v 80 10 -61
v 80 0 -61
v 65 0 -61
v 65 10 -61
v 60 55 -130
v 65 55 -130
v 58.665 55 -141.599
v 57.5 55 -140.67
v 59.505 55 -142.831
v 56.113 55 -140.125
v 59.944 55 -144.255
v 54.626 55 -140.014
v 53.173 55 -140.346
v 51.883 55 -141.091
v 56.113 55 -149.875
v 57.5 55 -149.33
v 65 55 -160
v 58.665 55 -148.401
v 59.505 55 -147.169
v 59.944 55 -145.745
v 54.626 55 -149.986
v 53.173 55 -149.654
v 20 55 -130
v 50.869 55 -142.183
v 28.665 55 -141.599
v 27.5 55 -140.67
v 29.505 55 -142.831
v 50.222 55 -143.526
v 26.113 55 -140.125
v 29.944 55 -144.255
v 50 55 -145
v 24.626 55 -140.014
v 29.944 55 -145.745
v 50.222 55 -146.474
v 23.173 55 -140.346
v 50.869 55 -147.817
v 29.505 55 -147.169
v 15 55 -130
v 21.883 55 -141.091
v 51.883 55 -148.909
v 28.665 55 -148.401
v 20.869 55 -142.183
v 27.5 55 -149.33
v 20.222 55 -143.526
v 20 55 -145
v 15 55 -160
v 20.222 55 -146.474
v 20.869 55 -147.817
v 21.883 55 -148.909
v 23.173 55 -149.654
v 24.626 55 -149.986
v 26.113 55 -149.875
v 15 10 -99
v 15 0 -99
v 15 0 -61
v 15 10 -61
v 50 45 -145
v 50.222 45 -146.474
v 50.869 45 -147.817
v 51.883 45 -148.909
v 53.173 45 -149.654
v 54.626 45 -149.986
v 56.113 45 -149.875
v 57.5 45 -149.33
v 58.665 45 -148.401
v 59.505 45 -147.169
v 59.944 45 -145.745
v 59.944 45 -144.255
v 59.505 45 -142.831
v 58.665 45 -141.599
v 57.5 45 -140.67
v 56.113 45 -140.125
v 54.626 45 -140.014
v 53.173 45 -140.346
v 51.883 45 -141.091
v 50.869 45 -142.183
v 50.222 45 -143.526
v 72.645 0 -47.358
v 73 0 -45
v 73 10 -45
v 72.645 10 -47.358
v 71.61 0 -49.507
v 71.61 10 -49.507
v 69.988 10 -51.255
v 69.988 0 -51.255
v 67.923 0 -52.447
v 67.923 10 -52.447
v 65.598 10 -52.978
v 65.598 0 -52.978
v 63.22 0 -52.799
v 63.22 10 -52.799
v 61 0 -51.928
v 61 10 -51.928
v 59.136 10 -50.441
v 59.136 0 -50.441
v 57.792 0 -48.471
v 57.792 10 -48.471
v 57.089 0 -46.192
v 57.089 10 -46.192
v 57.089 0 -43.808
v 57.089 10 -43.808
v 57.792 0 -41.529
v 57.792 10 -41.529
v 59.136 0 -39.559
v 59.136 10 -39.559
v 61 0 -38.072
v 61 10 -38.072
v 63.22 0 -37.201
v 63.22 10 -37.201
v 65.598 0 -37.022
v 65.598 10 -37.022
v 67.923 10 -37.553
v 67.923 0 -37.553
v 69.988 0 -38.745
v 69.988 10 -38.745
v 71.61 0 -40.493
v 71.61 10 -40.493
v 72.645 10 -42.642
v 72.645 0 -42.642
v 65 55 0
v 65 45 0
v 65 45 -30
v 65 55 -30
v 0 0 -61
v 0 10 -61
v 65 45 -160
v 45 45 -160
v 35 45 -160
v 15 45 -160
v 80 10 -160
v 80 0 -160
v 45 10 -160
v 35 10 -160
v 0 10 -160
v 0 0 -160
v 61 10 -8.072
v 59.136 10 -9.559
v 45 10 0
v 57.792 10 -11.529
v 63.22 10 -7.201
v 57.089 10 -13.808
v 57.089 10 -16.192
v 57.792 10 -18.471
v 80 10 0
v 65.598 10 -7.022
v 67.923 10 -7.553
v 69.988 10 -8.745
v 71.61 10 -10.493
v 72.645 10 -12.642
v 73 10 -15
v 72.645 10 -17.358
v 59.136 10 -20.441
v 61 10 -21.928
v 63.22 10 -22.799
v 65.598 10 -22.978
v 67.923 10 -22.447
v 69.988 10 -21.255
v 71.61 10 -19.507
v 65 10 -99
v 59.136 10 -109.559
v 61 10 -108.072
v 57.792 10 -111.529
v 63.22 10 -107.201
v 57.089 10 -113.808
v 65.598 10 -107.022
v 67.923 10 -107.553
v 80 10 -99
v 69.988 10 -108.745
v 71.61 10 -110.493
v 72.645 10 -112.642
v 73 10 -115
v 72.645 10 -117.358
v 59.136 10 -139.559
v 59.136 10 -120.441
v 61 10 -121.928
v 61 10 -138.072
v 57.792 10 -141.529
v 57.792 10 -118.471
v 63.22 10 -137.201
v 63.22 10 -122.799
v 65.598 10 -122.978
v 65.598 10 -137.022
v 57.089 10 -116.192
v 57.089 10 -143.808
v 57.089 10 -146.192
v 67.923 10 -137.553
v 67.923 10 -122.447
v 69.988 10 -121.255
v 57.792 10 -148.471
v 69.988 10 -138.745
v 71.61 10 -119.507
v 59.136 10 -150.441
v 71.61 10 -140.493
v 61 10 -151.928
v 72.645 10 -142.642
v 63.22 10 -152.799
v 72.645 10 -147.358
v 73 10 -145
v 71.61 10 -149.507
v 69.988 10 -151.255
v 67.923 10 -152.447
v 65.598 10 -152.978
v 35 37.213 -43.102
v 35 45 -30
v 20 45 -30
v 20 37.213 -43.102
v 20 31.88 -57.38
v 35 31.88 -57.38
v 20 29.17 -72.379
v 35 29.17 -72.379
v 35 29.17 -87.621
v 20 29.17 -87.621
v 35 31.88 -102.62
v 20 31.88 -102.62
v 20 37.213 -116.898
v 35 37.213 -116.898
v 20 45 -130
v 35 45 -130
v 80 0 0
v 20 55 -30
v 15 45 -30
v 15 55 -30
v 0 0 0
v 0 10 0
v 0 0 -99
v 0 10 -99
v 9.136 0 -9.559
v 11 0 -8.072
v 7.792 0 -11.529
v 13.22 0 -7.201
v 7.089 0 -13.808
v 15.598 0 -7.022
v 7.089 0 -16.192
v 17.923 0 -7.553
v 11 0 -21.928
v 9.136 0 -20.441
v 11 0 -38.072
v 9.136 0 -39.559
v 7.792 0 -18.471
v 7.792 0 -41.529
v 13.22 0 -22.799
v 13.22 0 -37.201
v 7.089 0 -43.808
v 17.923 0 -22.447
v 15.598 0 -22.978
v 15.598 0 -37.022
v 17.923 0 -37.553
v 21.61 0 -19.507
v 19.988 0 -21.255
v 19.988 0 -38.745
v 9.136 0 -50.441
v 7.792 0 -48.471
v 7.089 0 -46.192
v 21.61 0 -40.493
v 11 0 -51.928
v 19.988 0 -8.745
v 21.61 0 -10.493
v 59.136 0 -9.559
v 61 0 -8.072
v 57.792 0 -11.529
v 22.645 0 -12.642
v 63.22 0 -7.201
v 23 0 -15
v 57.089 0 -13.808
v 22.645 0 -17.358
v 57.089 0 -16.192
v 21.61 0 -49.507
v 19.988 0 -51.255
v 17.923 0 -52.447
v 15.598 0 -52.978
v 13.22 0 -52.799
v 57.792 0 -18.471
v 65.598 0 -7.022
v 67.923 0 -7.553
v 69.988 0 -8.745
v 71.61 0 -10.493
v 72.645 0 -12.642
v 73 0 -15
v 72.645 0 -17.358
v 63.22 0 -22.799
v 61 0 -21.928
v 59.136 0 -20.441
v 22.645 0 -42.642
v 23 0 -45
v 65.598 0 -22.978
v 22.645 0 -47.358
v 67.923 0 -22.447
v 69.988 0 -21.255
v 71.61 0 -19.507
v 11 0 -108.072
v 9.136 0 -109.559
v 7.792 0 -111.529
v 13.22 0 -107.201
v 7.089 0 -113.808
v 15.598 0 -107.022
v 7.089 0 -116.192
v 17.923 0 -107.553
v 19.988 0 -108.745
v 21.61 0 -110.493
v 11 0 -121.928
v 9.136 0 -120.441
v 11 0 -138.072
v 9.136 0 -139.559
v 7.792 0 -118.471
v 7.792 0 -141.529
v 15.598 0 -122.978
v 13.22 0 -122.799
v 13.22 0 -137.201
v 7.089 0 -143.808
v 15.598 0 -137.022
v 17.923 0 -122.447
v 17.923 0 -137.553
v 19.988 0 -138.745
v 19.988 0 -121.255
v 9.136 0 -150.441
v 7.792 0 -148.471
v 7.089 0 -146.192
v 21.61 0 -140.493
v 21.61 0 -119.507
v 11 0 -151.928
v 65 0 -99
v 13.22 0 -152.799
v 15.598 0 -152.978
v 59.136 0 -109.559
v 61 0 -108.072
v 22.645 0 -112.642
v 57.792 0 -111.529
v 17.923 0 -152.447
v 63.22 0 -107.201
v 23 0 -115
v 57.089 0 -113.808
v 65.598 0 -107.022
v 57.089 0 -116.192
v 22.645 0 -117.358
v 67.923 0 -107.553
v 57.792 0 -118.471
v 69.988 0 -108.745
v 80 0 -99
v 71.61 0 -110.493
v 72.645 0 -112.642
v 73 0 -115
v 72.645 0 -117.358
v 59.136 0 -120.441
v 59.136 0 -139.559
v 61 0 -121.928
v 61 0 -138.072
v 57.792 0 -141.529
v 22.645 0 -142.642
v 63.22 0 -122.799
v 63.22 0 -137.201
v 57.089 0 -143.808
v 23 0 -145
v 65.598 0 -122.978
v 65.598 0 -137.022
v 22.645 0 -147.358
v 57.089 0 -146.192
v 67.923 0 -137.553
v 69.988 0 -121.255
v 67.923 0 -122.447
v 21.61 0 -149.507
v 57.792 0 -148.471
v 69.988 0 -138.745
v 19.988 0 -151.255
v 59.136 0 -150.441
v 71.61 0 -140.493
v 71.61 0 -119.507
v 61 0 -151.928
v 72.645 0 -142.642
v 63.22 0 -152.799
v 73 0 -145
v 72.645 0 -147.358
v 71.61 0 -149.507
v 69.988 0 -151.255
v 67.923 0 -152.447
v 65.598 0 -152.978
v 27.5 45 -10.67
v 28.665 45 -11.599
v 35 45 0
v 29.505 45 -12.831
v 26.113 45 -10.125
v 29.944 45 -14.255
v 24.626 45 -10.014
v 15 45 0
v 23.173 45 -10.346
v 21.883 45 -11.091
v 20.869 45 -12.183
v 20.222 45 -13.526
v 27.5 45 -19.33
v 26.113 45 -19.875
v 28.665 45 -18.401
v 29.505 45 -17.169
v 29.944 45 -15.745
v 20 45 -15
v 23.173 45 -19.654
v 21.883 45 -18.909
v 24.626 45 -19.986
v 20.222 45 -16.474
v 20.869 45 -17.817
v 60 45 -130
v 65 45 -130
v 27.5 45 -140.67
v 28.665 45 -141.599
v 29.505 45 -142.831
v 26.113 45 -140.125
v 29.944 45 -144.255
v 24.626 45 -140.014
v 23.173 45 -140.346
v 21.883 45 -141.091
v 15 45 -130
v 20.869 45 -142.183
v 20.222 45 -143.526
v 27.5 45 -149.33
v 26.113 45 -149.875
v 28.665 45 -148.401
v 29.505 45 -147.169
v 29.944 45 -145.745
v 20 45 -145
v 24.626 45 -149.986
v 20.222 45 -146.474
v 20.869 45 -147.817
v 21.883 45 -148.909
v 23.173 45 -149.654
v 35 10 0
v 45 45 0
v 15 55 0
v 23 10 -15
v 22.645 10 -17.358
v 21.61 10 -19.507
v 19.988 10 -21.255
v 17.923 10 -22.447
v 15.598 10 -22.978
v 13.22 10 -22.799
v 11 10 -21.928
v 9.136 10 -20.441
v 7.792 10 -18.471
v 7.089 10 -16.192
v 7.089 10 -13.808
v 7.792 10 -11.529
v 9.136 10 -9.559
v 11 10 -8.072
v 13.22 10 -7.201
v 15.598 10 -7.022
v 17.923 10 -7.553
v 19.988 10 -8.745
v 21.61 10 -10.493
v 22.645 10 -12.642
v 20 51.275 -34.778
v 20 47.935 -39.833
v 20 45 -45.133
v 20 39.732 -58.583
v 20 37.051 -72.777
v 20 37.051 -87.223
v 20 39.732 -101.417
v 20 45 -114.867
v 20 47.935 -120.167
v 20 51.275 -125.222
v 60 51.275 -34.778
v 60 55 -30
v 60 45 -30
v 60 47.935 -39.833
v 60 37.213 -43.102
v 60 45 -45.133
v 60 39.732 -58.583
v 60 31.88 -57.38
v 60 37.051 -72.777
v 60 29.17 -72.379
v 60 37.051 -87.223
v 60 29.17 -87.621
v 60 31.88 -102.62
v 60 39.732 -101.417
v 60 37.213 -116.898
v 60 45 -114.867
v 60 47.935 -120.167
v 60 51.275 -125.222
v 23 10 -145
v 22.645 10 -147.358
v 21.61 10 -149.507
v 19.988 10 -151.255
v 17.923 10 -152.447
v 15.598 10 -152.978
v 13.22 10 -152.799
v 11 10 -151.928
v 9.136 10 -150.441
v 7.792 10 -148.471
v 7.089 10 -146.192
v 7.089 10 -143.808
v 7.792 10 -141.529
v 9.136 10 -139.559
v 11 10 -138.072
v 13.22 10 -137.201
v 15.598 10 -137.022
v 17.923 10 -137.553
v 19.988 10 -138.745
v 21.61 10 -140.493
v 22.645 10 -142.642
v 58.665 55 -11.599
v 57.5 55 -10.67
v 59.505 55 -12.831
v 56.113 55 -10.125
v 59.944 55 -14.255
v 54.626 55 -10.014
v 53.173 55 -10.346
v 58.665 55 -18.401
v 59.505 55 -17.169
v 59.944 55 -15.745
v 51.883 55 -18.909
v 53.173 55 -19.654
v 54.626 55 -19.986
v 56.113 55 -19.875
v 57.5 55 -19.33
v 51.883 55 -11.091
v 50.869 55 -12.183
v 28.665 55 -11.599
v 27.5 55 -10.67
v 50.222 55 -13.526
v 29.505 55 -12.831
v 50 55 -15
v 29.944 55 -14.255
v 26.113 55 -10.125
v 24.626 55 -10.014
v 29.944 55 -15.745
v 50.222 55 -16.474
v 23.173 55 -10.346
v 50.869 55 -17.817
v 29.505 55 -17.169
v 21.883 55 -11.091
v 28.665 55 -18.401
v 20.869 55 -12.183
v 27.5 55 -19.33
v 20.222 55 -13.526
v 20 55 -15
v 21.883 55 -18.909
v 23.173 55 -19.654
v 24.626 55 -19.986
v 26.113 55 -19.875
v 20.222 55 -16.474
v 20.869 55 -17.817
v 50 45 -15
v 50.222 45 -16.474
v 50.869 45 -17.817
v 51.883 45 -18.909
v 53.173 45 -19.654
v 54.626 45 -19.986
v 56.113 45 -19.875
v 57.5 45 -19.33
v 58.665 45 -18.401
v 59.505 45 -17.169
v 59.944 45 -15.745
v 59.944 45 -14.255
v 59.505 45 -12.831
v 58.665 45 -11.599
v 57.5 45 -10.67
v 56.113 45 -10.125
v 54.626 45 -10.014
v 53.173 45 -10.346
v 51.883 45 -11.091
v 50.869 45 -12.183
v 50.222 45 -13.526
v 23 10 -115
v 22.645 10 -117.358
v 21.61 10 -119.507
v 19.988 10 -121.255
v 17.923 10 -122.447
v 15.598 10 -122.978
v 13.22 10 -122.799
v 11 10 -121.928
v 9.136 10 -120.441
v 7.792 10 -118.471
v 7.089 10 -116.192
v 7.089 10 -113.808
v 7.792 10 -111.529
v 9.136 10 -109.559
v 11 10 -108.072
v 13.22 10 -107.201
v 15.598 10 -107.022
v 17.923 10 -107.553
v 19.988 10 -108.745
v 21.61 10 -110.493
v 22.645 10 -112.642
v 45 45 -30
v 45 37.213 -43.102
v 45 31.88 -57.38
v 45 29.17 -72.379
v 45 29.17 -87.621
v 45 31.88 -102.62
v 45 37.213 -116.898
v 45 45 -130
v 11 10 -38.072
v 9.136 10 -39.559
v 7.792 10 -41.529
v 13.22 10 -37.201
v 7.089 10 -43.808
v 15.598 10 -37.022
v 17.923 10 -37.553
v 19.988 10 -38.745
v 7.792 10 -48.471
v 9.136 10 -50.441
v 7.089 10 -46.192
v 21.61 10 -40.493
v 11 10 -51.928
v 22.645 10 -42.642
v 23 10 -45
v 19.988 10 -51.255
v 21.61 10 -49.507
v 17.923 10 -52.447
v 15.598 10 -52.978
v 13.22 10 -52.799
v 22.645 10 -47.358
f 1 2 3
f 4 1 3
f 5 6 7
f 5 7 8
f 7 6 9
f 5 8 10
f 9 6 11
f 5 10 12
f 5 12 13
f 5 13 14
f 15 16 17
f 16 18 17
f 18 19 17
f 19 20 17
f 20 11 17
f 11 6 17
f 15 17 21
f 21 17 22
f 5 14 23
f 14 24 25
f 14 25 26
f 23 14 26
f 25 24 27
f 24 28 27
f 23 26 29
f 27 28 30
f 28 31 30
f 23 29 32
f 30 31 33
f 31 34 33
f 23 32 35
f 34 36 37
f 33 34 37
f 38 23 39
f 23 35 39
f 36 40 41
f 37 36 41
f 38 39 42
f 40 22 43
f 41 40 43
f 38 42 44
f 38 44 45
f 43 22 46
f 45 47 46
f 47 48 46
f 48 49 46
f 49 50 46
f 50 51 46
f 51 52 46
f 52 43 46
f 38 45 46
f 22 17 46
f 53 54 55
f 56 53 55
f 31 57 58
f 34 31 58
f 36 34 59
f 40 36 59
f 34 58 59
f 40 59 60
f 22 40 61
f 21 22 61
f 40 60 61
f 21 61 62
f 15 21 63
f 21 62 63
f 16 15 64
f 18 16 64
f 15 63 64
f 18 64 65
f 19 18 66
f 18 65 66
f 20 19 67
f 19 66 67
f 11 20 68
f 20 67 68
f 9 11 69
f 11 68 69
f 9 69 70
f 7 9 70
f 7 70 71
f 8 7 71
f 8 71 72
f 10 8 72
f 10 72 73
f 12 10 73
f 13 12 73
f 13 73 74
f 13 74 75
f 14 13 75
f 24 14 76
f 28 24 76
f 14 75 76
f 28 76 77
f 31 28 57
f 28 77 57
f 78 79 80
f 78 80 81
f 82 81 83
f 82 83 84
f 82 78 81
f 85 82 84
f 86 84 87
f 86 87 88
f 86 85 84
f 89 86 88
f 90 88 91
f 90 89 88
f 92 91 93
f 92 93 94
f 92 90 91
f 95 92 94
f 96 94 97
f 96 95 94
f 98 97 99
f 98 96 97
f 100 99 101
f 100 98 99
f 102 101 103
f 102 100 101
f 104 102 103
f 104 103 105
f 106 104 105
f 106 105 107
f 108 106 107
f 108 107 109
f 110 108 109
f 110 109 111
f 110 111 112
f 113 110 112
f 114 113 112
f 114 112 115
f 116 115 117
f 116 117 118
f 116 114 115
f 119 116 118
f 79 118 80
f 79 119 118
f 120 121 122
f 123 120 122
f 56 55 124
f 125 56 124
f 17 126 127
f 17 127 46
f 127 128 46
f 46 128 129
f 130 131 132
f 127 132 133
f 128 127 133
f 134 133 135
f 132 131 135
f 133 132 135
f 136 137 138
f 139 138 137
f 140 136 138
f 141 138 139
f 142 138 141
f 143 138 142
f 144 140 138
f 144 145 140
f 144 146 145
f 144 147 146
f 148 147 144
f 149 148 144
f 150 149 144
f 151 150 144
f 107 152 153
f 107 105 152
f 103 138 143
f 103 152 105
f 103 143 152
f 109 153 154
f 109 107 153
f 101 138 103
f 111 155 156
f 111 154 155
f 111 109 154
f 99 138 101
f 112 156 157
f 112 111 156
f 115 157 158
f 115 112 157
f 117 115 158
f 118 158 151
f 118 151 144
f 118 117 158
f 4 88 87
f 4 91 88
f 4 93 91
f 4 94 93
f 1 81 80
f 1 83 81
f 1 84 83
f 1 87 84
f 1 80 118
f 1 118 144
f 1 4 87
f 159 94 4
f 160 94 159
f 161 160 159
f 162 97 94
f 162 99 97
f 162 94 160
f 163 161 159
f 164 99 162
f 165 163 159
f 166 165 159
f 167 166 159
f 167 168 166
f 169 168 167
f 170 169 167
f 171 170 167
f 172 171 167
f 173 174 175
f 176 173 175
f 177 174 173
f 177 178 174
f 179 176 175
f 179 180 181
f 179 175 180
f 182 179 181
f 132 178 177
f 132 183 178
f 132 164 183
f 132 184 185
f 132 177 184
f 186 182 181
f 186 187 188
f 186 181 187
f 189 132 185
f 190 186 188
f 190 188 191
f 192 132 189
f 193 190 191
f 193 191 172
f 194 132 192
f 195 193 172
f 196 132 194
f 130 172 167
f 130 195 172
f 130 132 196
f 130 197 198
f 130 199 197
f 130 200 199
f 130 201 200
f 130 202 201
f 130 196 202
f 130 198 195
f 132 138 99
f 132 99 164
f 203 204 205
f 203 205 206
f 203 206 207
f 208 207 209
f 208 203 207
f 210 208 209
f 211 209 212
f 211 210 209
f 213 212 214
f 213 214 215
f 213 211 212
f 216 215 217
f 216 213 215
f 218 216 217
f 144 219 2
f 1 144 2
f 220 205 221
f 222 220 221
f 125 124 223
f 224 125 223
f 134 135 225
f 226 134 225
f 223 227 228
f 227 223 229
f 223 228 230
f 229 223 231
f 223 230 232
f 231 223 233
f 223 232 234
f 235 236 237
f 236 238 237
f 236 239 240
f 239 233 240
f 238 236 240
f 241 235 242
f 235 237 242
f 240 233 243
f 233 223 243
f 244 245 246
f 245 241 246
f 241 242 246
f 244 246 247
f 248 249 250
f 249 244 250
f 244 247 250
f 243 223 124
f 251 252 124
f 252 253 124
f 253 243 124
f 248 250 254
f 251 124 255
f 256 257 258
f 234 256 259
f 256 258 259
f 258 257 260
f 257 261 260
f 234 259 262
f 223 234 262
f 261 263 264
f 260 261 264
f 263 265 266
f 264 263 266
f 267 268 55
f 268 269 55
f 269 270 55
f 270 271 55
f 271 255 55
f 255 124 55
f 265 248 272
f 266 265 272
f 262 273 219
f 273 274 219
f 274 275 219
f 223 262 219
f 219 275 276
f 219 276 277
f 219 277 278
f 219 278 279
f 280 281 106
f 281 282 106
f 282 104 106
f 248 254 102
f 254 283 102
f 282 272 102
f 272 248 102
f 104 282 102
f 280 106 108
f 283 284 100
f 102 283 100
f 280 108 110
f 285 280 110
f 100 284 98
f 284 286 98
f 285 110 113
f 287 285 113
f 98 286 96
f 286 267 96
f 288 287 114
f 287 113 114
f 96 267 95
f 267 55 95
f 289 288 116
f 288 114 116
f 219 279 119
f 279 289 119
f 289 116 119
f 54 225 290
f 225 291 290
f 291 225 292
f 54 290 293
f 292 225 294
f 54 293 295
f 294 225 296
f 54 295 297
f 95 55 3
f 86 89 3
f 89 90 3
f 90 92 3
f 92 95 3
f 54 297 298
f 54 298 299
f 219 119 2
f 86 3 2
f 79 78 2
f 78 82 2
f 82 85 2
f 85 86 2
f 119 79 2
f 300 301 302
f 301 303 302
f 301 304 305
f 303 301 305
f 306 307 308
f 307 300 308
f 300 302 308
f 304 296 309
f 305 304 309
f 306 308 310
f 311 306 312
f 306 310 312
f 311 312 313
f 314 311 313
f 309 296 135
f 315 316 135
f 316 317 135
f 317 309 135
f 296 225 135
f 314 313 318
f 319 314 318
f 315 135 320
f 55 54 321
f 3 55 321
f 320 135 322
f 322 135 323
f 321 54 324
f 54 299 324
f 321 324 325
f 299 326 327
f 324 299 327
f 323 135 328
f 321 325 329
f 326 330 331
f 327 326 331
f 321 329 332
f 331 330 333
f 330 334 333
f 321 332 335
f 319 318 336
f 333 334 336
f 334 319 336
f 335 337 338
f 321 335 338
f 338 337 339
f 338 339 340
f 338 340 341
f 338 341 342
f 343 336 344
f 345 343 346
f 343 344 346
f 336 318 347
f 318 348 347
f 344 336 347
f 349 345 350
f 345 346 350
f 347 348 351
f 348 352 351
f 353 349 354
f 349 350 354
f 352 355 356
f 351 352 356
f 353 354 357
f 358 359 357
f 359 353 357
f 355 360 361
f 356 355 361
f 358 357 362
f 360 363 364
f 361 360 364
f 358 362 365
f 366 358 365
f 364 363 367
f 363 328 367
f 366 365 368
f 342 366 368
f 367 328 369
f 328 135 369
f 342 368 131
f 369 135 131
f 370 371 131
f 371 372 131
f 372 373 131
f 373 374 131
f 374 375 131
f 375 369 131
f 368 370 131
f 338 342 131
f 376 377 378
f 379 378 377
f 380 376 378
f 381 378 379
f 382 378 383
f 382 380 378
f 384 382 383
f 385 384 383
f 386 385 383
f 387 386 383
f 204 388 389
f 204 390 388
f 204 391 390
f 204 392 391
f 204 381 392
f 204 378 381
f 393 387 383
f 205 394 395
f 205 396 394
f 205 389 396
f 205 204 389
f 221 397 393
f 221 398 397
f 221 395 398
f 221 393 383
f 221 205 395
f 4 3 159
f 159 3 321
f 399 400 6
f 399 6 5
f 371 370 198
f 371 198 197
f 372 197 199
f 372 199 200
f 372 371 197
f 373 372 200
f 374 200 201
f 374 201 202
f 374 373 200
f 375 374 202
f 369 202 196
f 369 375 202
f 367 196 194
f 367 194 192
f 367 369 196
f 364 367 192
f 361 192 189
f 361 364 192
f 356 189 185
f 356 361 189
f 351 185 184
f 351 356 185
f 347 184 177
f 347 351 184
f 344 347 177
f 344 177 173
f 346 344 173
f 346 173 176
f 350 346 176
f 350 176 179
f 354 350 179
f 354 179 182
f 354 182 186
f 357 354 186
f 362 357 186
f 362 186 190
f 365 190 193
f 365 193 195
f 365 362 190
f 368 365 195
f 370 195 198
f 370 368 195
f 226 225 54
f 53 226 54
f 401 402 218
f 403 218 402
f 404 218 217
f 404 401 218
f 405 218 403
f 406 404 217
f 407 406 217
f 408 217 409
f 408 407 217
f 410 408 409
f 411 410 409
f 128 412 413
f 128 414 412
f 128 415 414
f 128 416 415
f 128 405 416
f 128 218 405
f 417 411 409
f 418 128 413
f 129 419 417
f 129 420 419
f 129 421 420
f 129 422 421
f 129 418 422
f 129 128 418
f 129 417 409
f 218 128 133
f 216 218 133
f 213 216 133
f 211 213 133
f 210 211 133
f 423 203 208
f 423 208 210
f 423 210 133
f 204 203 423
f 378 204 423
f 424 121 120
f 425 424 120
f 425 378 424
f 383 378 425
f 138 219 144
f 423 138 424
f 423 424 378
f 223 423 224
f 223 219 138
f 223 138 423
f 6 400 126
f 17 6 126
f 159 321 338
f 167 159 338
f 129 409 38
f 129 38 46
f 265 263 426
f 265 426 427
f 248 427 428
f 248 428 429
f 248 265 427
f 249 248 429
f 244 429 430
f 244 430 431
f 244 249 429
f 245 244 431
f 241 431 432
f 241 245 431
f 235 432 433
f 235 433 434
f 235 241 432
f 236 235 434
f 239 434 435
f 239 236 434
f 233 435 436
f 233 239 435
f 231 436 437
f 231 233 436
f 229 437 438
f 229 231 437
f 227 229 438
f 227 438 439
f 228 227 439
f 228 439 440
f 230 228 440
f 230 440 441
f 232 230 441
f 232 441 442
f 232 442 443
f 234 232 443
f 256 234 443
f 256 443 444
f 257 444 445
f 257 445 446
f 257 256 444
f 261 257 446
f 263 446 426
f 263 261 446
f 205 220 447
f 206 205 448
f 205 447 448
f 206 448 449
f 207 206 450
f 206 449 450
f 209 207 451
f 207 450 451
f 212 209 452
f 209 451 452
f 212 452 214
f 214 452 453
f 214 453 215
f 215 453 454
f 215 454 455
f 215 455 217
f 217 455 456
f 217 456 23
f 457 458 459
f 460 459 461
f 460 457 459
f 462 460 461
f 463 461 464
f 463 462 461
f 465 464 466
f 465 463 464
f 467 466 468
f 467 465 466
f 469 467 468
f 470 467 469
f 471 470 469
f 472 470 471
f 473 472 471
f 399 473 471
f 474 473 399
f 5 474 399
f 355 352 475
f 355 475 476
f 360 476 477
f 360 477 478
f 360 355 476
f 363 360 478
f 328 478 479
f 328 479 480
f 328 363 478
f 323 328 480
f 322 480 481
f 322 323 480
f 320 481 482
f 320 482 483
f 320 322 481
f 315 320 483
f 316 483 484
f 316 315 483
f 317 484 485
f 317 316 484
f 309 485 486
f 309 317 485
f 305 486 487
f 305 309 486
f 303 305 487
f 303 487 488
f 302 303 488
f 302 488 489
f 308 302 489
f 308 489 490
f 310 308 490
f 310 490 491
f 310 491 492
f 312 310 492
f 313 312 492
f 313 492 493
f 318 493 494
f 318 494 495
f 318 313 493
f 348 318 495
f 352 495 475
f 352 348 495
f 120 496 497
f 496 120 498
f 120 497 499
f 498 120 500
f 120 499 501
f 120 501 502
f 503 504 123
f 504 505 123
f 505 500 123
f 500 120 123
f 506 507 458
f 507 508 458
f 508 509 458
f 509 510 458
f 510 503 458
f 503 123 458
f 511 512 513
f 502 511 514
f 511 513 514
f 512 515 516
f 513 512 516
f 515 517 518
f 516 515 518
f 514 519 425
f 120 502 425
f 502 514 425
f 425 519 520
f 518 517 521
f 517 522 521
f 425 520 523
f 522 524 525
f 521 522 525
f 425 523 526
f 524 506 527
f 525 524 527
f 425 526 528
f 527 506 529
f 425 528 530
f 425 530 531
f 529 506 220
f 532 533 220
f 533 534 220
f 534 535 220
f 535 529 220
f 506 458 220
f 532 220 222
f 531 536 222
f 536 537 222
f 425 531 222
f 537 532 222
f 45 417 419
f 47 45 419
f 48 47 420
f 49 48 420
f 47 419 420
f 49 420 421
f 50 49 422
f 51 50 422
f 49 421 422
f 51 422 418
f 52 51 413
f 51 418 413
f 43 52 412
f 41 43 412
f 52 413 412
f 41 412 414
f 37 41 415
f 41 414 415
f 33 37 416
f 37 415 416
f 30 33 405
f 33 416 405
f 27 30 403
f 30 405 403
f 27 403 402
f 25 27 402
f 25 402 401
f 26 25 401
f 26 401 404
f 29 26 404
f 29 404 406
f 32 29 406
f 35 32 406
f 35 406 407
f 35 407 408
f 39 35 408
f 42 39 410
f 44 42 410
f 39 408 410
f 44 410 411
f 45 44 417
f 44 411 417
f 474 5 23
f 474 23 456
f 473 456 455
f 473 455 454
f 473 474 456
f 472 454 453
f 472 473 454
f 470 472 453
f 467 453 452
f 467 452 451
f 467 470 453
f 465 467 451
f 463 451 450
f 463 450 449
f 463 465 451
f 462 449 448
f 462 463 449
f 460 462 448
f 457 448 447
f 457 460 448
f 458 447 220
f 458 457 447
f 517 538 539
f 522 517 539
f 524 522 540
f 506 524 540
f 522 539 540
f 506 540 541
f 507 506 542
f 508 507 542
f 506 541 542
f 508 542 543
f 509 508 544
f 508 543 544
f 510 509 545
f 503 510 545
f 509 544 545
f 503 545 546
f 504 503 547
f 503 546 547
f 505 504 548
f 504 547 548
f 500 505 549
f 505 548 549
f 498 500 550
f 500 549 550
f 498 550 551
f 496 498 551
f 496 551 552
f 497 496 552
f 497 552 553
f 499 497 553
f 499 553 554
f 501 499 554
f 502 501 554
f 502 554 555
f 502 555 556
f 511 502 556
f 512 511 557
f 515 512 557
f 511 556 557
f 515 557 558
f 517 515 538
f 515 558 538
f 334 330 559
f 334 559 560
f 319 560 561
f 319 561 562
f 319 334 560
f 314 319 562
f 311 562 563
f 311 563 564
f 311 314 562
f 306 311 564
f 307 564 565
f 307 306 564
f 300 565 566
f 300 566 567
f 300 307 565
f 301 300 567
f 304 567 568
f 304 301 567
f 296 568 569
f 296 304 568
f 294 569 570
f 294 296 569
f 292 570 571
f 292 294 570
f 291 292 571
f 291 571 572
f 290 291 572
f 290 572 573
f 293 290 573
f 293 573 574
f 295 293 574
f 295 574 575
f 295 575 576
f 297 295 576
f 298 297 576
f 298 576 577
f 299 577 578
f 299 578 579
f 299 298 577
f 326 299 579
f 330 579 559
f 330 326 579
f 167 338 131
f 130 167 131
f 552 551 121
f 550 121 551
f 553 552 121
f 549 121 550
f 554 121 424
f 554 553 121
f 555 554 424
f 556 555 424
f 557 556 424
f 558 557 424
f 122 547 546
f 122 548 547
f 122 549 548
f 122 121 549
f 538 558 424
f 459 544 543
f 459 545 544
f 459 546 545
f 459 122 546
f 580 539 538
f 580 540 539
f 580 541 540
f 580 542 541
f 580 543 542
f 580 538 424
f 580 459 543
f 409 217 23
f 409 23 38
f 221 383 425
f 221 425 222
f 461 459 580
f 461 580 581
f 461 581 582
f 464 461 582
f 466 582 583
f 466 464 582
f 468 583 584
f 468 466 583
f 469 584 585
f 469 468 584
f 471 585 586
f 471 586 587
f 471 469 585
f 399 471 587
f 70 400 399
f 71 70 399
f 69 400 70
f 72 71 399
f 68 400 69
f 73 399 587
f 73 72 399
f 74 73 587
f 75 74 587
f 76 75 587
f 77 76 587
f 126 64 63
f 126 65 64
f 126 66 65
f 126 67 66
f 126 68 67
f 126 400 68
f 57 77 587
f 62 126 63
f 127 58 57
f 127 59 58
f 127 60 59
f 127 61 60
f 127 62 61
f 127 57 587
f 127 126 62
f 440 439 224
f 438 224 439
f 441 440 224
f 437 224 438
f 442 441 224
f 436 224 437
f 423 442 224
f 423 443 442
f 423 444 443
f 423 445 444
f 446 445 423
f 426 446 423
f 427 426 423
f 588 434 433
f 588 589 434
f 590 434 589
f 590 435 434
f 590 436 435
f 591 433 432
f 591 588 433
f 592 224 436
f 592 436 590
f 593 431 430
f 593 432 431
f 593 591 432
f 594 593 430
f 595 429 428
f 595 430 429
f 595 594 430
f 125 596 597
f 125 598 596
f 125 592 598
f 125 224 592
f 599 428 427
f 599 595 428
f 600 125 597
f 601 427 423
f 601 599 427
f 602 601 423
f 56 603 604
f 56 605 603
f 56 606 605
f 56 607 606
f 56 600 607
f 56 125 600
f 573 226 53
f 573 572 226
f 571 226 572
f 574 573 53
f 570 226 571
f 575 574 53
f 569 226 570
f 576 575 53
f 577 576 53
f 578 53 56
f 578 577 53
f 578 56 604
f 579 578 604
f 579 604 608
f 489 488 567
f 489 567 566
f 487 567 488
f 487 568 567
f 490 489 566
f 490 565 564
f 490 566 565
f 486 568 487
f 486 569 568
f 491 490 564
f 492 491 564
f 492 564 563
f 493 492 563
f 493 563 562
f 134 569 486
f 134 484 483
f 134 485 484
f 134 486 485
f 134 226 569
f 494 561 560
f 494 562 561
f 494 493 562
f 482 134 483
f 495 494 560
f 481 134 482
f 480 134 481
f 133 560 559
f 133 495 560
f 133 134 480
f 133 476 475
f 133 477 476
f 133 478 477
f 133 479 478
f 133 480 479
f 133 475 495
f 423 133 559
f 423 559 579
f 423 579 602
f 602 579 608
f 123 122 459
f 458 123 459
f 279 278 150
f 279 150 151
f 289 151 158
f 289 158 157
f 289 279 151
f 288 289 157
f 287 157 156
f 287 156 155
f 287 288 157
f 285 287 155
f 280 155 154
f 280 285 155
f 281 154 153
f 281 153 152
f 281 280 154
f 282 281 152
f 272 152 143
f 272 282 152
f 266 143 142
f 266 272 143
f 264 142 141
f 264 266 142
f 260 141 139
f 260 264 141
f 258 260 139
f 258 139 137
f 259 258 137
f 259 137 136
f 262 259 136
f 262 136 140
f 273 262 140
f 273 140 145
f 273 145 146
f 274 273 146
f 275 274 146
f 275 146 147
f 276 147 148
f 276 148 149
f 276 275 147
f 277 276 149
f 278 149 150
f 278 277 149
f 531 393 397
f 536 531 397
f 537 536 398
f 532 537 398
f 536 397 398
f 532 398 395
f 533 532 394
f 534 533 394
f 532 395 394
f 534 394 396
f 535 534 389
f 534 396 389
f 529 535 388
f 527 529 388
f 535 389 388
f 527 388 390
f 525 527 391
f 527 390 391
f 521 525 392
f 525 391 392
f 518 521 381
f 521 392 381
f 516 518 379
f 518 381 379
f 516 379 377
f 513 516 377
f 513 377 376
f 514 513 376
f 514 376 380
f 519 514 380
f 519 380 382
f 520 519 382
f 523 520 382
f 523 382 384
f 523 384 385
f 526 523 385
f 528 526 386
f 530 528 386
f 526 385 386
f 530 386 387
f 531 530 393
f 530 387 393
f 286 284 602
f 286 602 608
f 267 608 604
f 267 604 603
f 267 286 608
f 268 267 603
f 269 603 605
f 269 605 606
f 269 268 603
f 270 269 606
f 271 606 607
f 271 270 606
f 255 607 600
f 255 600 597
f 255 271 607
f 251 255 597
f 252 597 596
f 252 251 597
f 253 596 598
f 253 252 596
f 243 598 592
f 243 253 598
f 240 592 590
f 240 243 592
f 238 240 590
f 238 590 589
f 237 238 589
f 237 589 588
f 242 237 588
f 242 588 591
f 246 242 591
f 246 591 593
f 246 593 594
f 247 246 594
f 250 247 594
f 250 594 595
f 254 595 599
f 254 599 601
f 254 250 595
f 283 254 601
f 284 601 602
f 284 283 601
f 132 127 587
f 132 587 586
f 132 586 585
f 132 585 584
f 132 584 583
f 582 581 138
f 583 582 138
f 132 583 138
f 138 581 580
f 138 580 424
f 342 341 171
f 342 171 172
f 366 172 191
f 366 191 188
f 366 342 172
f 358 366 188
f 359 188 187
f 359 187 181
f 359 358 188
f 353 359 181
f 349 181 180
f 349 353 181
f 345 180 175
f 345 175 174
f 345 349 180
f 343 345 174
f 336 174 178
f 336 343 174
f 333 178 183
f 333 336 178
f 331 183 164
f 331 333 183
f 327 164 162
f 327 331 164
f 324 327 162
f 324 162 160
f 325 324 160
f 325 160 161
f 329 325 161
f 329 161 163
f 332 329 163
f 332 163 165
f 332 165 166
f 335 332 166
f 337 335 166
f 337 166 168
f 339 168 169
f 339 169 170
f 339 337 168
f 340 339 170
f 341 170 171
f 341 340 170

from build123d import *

# Parameters (mm, degrees)
SKETCH1_R           = 8
BOSS_EXTRUDE1_DEPTH = 10
BOSS_EXTRUDE2_DEPTH = 5
SKETCH7_W           = 50
SKETCH7_H           = 30
SKETCH7_R           = 5
BOSS_EXTRUDE3_DEPTH = 10
BOSS_EXTRUDE5_DEPTH = 20
CUT_EXTRUDE1_DEPTH  = 20


with BuildPart() as part:
    # Sketch1 → Boss-Extrude1 (new body)
    with BuildSketch(Plane(origin=(0, 0, 0), x_dir=(1, 0, 0), z_dir=(0, 1, 0))):
        Polygon((80, 160), (0, 160), (0, 99), (15, 99), (15, 61), (0, 61), (0, 0), (80, 0), (80, 61), (65, 61), (65, 99), (80, 99), align=None)
        with Locations((15, 15)):
            Circle(SKETCH1_R, mode=Mode.SUBTRACT)
        with Locations((15, 45)):
            Circle(SKETCH1_R, mode=Mode.SUBTRACT)
        with Locations((65, 15)):
            Circle(SKETCH1_R, mode=Mode.SUBTRACT)
        with Locations((65, 45)):
            Circle(SKETCH1_R, mode=Mode.SUBTRACT)
        with Locations((15, 115)):
            Circle(SKETCH1_R, mode=Mode.SUBTRACT)
        with Locations((15, 145)):
            Circle(SKETCH1_R, mode=Mode.SUBTRACT)
        with Locations((65, 115)):
            Circle(SKETCH1_R, mode=Mode.SUBTRACT)
        with Locations((65, 145)):
            Circle(SKETCH1_R, mode=Mode.SUBTRACT)
    extrude(amount=BOSS_EXTRUDE1_DEPTH)

    # Sketch2 → Boss-Extrude2 (add, symmetric)
    with BuildSketch(Plane(origin=(40, 0, 0), x_dir=(0, 0, -1), z_dir=(1, 0, 0))):
        Polygon((160, 10), (99, 10), (61, 10), (0, 10), (0, 45), (160, 45), align=None)
    extrude(amount=BOSS_EXTRUDE2_DEPTH, both=True)

    # Sketch7 → Boss-Extrude3 (add)
    with BuildSketch(Plane(origin=(0, 45, 0), x_dir=(-1, 0, 0), z_dir=(0, -1, 0))):
        with Locations((-40, 15)):
            Rectangle(SKETCH7_W, SKETCH7_H)
        with Locations((-55, 15)):
            Circle(SKETCH7_R, mode=Mode.SUBTRACT)
        with Locations((-25, 15)):
            Circle(SKETCH7_R, mode=Mode.SUBTRACT)
        with Locations((-40, 145)):
            Rectangle(SKETCH7_W, SKETCH7_H)
        with Locations((-25, 145)):
            Circle(SKETCH7_R, mode=Mode.SUBTRACT)
        with Locations((-55, 145)):
            Circle(SKETCH7_R, mode=Mode.SUBTRACT)
    extrude(amount=-BOSS_EXTRUDE3_DEPTH)

    # Sketch12 → Boss-Extrude5 (add, symmetric)
    with BuildSketch(Plane(origin=(40, 0, 0), x_dir=(0, 0, -1), z_dir=(1, 0, 0))):
        with BuildLine():
            ThreePointArc((30, 45), (80, 28.829043194), (130, 45))
            Line((130, 45), (114.867292292, 45))
            ThreePointArc((114.867292292, 45), (80, 36.713596412), (45.132707708, 45))
            Line((45.132707708, 45), (30, 45))
        make_face()
        with BuildLine():
            Line((30, 55), (30, 45))
            Line((30, 45), (45.132707708, 45))
            ThreePointArc((45.132707708, 45), (37.272791745, 49.555761041), (30, 55))
        make_face()
        with BuildLine():
            Line((114.867292292, 45), (130, 45))
            Line((130, 45), (130, 55))
            ThreePointArc((130, 55), (122.727208255, 49.555761041), (114.867292292, 45))
        make_face()
    extrude(amount=BOSS_EXTRUDE5_DEPTH, both=True)

    # Sketch10 → Cut-Extrude1 (cut, symmetric)
    with BuildSketch(Plane(origin=(45, 0, 0), x_dir=(0, 0, -1), z_dir=(1, 0, 0))):
        with BuildLine():
            Line((114.867292292, 45), (45.132707708, 45))
            ThreePointArc((45.132707708, 45), (80, 36.713596412), (114.867292292, 45))
        make_face()
    extrude(amount=CUT_EXTRUDE1_DEPTH, both=True, mode=Mode.SUBTRACT)


solid = part.part
